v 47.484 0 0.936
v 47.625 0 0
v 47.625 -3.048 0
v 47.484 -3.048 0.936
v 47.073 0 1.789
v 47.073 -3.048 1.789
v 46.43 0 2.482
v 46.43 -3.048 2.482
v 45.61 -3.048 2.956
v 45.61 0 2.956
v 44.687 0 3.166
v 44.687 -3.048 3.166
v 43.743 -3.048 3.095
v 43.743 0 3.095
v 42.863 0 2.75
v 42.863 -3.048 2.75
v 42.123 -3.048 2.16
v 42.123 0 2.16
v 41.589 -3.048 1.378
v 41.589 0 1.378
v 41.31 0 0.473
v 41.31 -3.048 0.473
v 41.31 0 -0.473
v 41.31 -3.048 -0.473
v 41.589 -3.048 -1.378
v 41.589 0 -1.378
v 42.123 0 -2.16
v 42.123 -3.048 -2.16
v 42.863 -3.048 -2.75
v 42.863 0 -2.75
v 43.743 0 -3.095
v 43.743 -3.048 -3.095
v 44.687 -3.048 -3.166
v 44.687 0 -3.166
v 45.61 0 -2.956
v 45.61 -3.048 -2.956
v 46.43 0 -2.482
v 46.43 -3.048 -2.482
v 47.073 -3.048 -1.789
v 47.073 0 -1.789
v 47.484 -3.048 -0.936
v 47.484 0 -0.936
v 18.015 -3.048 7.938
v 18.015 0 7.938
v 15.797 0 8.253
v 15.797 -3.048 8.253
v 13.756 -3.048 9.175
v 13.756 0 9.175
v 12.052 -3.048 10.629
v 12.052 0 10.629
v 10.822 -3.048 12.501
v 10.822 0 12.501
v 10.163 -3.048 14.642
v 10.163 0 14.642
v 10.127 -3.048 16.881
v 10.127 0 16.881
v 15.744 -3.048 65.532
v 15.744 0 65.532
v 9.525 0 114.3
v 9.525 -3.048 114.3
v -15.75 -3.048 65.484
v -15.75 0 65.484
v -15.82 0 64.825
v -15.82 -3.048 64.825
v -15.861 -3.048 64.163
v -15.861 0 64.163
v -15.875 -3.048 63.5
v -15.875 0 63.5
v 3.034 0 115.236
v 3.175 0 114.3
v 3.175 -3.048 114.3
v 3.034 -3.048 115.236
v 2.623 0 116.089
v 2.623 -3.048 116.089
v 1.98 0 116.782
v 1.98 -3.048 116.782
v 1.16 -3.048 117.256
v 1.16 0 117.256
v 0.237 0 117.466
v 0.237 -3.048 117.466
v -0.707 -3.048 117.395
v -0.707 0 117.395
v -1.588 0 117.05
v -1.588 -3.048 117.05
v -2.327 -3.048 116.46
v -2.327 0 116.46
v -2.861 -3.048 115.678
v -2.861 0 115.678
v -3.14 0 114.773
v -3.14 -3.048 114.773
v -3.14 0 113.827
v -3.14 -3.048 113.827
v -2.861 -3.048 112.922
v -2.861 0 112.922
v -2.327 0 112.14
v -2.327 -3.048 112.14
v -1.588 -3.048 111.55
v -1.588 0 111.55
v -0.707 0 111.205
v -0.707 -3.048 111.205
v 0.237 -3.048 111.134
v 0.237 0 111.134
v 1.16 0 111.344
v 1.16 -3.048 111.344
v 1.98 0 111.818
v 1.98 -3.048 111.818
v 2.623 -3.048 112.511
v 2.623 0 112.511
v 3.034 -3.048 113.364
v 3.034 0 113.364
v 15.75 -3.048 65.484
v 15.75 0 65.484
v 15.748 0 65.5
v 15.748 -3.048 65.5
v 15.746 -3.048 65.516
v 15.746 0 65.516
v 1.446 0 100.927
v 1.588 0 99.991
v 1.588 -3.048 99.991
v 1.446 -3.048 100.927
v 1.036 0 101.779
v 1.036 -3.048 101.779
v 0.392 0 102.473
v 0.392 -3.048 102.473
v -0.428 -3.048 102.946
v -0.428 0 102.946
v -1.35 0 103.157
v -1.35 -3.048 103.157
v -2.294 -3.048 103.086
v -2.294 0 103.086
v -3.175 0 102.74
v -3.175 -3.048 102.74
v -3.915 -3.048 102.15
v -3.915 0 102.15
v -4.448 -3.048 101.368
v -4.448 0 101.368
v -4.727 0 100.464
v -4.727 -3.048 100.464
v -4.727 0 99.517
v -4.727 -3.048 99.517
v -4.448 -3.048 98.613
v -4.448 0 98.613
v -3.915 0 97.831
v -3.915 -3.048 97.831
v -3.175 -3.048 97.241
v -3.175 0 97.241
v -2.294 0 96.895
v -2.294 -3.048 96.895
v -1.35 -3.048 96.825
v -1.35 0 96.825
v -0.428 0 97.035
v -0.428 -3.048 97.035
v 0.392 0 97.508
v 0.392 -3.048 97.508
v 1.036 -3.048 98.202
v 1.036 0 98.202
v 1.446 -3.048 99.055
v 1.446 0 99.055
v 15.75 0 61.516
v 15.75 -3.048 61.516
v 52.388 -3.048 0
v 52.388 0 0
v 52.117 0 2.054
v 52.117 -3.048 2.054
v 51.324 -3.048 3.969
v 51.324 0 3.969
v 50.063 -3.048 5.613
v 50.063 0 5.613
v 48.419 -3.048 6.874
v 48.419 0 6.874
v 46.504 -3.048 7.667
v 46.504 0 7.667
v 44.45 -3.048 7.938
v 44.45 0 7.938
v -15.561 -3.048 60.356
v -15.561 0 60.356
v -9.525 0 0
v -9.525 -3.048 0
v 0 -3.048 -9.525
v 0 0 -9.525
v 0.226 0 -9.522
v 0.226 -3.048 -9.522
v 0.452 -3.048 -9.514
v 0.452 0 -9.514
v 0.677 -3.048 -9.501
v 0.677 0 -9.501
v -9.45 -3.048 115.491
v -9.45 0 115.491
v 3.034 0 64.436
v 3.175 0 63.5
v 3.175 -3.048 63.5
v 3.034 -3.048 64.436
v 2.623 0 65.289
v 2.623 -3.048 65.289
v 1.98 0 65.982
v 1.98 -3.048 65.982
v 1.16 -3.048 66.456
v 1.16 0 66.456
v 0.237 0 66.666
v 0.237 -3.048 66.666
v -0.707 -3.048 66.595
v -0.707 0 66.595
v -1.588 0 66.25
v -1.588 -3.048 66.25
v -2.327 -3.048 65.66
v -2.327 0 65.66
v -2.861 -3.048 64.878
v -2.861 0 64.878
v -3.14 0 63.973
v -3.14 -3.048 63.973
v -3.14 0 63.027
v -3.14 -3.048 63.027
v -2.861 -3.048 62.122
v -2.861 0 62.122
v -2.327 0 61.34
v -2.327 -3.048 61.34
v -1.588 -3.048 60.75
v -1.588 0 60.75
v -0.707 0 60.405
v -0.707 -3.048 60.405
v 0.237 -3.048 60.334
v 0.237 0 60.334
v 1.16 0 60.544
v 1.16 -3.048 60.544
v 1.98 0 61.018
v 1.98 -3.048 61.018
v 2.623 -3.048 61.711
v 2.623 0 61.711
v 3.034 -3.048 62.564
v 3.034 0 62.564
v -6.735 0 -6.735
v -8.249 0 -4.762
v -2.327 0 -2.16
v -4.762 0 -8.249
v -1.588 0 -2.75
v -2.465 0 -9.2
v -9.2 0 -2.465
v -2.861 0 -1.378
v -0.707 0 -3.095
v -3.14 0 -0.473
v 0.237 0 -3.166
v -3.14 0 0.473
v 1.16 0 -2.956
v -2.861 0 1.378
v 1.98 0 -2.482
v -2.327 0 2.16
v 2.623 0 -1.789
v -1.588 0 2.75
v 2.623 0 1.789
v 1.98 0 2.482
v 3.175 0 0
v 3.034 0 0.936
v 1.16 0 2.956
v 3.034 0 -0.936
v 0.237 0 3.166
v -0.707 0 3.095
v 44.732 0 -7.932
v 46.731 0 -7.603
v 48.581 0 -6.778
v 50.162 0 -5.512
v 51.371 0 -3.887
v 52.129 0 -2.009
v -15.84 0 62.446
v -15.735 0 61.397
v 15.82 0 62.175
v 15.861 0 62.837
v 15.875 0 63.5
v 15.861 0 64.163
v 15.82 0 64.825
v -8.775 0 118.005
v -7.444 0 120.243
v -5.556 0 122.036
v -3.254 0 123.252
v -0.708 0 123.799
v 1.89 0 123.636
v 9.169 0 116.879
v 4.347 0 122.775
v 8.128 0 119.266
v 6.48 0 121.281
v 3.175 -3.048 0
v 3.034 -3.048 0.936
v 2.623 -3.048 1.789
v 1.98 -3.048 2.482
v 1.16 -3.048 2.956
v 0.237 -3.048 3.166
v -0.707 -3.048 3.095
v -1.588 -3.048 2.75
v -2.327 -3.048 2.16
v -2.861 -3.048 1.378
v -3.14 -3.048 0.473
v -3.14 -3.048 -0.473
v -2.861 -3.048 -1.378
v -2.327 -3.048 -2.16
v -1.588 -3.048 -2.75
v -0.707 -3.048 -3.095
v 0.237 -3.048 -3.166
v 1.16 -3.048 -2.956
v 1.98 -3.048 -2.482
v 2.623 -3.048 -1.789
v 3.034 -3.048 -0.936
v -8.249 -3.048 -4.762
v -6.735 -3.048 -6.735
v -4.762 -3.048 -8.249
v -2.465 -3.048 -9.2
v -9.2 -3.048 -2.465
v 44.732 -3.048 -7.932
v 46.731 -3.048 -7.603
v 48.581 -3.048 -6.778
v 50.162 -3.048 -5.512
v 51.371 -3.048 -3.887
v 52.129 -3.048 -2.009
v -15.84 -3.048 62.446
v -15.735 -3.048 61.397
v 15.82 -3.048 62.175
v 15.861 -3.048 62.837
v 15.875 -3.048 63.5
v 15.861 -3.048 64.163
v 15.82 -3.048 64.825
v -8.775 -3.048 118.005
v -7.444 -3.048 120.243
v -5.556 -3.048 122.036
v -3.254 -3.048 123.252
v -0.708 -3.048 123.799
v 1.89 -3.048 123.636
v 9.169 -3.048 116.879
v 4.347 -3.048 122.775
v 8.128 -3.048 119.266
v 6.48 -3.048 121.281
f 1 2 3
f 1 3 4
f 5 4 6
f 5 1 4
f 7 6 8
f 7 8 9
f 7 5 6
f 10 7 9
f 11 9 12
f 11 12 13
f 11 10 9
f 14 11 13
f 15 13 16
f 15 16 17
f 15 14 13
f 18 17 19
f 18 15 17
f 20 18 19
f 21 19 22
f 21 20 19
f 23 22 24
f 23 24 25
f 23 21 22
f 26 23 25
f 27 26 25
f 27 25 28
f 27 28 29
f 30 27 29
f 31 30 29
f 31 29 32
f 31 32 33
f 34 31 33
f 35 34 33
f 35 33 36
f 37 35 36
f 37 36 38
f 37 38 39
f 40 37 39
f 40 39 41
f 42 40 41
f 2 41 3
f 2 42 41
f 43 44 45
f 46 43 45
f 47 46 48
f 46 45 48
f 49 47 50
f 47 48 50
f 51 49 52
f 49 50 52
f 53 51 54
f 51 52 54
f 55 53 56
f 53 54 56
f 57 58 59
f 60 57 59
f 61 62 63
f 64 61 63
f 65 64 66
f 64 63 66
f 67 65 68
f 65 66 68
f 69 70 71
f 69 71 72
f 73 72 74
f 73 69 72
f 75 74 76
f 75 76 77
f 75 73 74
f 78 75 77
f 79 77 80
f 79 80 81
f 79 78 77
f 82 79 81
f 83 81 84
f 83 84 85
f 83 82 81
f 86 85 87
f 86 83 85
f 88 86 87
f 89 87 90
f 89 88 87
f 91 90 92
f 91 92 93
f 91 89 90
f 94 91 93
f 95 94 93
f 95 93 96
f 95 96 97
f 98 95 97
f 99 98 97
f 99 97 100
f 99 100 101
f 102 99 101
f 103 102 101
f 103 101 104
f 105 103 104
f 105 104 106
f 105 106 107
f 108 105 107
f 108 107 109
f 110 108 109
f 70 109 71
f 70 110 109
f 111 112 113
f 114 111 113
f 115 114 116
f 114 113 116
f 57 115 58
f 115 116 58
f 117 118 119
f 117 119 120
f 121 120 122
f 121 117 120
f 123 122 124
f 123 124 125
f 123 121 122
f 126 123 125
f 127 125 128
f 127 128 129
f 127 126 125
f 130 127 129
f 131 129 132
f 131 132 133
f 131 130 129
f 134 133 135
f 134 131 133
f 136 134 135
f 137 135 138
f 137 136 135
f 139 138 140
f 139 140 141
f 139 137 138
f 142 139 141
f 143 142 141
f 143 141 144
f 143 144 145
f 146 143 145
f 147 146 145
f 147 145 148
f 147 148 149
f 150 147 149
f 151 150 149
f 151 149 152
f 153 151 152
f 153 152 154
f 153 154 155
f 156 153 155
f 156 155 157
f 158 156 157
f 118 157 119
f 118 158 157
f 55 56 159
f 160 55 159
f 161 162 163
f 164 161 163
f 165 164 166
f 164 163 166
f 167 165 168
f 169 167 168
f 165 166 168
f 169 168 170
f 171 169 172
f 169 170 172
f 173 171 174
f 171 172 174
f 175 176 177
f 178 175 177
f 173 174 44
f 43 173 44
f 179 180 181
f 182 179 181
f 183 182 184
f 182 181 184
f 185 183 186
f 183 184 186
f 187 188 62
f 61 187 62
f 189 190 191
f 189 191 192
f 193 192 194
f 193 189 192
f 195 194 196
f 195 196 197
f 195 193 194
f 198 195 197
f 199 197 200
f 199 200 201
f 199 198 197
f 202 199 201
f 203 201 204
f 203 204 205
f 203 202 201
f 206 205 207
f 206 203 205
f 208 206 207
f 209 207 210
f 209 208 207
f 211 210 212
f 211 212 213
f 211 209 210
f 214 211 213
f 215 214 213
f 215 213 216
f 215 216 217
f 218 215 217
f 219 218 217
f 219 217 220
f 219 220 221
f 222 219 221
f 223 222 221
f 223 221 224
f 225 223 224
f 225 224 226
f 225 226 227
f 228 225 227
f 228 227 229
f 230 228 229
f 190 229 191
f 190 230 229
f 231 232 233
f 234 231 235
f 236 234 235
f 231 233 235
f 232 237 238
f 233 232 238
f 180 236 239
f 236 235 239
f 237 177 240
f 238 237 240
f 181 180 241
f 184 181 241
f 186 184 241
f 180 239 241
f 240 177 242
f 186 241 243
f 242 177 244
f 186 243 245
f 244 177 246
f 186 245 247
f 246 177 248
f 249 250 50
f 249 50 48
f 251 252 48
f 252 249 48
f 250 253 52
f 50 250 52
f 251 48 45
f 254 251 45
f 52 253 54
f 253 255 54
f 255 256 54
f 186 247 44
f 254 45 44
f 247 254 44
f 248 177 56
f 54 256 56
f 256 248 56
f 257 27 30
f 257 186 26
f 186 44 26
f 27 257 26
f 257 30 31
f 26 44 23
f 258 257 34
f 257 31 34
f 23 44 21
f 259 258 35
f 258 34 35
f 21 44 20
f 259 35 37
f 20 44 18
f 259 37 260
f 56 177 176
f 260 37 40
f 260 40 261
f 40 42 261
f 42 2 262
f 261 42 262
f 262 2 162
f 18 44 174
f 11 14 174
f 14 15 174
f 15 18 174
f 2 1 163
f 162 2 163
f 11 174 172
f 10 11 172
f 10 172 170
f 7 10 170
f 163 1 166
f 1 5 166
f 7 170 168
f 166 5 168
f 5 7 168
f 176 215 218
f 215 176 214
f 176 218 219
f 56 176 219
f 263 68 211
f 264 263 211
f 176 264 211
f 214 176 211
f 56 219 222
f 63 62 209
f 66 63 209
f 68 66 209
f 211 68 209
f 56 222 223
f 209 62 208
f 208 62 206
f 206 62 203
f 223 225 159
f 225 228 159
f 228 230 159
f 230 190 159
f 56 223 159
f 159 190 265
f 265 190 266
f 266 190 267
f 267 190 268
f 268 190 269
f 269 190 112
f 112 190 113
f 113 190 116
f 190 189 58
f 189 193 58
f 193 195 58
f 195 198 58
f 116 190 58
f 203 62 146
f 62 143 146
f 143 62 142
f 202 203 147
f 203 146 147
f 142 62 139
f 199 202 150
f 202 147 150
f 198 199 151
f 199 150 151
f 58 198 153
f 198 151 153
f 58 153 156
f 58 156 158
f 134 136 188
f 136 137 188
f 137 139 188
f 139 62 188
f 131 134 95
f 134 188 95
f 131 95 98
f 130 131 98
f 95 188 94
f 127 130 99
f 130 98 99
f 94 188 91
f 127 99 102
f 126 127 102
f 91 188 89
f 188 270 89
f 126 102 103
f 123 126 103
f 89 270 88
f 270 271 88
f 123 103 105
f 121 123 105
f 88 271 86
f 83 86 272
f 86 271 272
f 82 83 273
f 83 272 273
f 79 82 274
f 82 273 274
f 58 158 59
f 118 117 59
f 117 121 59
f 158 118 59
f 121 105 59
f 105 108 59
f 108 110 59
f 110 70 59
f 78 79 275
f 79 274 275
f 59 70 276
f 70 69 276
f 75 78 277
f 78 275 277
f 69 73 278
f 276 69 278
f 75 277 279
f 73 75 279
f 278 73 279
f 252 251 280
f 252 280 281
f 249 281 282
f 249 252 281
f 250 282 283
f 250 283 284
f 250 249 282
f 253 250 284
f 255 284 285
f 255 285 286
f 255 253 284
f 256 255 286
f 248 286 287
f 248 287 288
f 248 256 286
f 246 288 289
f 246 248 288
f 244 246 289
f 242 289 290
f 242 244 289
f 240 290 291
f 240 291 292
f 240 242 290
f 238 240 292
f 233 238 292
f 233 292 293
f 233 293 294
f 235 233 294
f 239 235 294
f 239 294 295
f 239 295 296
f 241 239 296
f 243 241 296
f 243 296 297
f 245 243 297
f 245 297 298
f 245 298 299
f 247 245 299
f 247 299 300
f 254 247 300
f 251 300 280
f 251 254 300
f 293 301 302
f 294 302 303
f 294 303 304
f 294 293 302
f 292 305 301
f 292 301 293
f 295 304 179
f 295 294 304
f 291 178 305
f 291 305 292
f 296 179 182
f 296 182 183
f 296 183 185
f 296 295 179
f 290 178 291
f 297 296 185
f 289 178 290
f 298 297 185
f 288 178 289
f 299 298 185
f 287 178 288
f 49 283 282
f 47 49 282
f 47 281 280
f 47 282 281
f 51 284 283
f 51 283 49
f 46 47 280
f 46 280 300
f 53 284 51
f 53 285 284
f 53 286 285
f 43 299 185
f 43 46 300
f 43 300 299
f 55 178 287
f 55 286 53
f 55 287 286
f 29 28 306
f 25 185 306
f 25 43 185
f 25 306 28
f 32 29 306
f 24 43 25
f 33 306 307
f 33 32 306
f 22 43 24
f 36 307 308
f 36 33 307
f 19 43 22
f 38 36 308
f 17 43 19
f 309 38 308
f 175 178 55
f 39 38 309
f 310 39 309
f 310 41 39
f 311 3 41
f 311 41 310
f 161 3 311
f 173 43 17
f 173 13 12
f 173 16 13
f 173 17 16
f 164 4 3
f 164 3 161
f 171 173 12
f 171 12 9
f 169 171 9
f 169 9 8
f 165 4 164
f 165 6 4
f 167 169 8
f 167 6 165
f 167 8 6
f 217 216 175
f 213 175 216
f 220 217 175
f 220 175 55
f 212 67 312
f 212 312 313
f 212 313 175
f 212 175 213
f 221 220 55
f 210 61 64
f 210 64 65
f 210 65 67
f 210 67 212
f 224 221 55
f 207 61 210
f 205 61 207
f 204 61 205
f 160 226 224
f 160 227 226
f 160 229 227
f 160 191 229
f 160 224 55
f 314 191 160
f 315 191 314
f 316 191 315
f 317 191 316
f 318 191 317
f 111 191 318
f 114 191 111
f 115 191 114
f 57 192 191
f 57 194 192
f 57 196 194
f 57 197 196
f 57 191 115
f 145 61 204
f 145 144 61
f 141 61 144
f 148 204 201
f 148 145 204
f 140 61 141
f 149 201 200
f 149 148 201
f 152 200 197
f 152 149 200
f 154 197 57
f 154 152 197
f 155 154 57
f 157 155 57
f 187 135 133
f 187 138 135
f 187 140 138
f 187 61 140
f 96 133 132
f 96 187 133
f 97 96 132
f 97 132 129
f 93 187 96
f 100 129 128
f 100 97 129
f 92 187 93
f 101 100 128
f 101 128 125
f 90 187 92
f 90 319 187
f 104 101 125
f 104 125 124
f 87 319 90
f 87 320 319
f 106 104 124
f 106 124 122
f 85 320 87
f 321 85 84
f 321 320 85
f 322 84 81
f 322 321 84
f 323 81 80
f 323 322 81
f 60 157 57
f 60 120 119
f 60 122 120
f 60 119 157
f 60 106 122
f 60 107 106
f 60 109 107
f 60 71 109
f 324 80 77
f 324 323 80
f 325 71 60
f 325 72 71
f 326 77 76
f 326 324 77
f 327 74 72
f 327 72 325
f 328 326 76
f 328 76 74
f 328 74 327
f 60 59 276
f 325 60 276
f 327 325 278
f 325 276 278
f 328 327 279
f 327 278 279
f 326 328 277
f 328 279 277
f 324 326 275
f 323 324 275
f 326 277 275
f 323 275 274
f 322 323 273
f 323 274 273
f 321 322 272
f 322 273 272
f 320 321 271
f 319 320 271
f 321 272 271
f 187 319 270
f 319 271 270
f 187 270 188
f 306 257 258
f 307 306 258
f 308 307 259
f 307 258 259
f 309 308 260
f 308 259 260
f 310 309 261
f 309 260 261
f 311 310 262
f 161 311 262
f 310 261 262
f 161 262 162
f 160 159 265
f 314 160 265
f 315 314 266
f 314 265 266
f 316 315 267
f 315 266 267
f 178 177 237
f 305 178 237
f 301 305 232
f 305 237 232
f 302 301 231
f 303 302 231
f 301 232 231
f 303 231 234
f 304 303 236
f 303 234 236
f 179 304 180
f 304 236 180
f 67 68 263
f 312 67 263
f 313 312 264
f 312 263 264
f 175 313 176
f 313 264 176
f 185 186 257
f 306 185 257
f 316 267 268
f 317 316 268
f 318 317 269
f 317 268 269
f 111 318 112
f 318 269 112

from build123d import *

# Parameters (mm, degrees)
F0_R     = 3.175
F1_DEPTH = 3.048


with BuildPart() as f1:
    # F0 (on Front) → F1 (new body)
    with BuildSketch(Plane.XZ):
        with BuildLine():
            ThreePointArc((-15.750488, 65.484375), (0, 79.375), (15.750488, 65.484375))
            Line((15.750488, 65.484375), (9.525, 114.3))
            ThreePointArc((9.525, 114.3), (-0.596483, 104.793695), (-9.450293, 115.490625))
            Line((-9.450293, 115.490625), (-15.750488, 65.484375))
        make_face()
        with Locations((-1.5875, 99.990685)):
            Circle(F0_R, mode=Mode.SUBTRACT)
        with BuildLine():
            ThreePointArc((15.750488, 61.515625), (15.843841, 62.505861), (15.875, 63.5))
            ThreePointArc((15.875, 63.5), (15.843841, 64.494139), (15.750488, 65.484375))
            ThreePointArc((15.750488, 65.484375), (0, 79.375), (-15.750488, 65.484375))
            ThreePointArc((-15.750488, 65.484375), (-15.843841, 64.494139), (-15.875, 63.5))
            Line((-15.875, 63.5), (-15.560644, 60.356436))
            ThreePointArc((-15.560644, 60.356436), (0.587316, 47.635868), (15.750488, 61.515625))
        make_face()
        with Locations((0, 63.5)):
            Circle(F0_R, mode=Mode.SUBTRACT)
        with BuildLine():
            Line((10.127114, 16.881475), (15.750488, 61.515625))
            ThreePointArc((15.750488, 61.515625), (0.587316, 47.635868), (-15.560644, 60.356436))
            Line((-15.560644, 60.356436), (-9.525, 0))
            ThreePointArc((-9.525, 0), (0, 9.525), (9.525, 0))
            ThreePointArc((9.525, 0), (6.970557, -6.491299), (0.677344, -9.500886))
            Line((0.677344, -9.500886), (44.732405, -7.932475))
            ThreePointArc((44.732405, -7.932475), (36.513756, -0.141225), (44.45, 7.9375))
            Line((44.45, 7.9375), (18.014958, 7.9375))
            ThreePointArc((18.014958, 7.9375), (12.052308, 10.629137), (10.127114, 16.881475))
        make_face()
        with BuildLine():
            ThreePointArc((-9.450293, 115.490625), (-0.596483, 104.793695), (9.525, 114.3))
            ThreePointArc((9.525, 114.3), (0.596483, 123.806305), (-9.450293, 115.490625))
        make_face()
        with Locations((0, 114.3)):
            Circle(F0_R, mode=Mode.SUBTRACT)
        with BuildLine():
            ThreePointArc((-15.875, 63.5), (-15.796215, 61.920378), (-15.560644, 60.356436))
            Line((-15.560644, 60.356436), (-15.875, 63.5))
        make_face()
        with BuildLine():
            ThreePointArc((9.525, 0), (0, 9.525), (-9.525, 0))
            ThreePointArc((-9.525, 0), (-6.735192, -6.735192), (0, -9.525))
            Line((0, -9.525), (0.677344, -9.500886))
            ThreePointArc((0.677344, -9.500886), (6.970557, -6.491299), (9.525, 0))
        make_face()
        Circle(F0_R, mode=Mode.SUBTRACT)
        with BuildLine():
            Line((0.677344, -9.500886), (0, -9.525))
            ThreePointArc((0, -9.525), (0.338886, -9.51897), (0.677344, -9.500886))
        make_face()
        with BuildLine():
            ThreePointArc((52.3875, 0), (50.06266, 5.61266), (44.45, 7.9375))
            ThreePointArc((44.45, 7.9375), (36.513756, -0.141225), (44.732405, -7.932475))
            ThreePointArc((44.732405, -7.932475), (50.161633, -5.51191), (52.3875, 0))
        make_face()
        with Locations((44.45, 0)):
            Circle(F0_R, mode=Mode.SUBTRACT)
    extrude(amount=F1_DEPTH)


solid = f1.part
